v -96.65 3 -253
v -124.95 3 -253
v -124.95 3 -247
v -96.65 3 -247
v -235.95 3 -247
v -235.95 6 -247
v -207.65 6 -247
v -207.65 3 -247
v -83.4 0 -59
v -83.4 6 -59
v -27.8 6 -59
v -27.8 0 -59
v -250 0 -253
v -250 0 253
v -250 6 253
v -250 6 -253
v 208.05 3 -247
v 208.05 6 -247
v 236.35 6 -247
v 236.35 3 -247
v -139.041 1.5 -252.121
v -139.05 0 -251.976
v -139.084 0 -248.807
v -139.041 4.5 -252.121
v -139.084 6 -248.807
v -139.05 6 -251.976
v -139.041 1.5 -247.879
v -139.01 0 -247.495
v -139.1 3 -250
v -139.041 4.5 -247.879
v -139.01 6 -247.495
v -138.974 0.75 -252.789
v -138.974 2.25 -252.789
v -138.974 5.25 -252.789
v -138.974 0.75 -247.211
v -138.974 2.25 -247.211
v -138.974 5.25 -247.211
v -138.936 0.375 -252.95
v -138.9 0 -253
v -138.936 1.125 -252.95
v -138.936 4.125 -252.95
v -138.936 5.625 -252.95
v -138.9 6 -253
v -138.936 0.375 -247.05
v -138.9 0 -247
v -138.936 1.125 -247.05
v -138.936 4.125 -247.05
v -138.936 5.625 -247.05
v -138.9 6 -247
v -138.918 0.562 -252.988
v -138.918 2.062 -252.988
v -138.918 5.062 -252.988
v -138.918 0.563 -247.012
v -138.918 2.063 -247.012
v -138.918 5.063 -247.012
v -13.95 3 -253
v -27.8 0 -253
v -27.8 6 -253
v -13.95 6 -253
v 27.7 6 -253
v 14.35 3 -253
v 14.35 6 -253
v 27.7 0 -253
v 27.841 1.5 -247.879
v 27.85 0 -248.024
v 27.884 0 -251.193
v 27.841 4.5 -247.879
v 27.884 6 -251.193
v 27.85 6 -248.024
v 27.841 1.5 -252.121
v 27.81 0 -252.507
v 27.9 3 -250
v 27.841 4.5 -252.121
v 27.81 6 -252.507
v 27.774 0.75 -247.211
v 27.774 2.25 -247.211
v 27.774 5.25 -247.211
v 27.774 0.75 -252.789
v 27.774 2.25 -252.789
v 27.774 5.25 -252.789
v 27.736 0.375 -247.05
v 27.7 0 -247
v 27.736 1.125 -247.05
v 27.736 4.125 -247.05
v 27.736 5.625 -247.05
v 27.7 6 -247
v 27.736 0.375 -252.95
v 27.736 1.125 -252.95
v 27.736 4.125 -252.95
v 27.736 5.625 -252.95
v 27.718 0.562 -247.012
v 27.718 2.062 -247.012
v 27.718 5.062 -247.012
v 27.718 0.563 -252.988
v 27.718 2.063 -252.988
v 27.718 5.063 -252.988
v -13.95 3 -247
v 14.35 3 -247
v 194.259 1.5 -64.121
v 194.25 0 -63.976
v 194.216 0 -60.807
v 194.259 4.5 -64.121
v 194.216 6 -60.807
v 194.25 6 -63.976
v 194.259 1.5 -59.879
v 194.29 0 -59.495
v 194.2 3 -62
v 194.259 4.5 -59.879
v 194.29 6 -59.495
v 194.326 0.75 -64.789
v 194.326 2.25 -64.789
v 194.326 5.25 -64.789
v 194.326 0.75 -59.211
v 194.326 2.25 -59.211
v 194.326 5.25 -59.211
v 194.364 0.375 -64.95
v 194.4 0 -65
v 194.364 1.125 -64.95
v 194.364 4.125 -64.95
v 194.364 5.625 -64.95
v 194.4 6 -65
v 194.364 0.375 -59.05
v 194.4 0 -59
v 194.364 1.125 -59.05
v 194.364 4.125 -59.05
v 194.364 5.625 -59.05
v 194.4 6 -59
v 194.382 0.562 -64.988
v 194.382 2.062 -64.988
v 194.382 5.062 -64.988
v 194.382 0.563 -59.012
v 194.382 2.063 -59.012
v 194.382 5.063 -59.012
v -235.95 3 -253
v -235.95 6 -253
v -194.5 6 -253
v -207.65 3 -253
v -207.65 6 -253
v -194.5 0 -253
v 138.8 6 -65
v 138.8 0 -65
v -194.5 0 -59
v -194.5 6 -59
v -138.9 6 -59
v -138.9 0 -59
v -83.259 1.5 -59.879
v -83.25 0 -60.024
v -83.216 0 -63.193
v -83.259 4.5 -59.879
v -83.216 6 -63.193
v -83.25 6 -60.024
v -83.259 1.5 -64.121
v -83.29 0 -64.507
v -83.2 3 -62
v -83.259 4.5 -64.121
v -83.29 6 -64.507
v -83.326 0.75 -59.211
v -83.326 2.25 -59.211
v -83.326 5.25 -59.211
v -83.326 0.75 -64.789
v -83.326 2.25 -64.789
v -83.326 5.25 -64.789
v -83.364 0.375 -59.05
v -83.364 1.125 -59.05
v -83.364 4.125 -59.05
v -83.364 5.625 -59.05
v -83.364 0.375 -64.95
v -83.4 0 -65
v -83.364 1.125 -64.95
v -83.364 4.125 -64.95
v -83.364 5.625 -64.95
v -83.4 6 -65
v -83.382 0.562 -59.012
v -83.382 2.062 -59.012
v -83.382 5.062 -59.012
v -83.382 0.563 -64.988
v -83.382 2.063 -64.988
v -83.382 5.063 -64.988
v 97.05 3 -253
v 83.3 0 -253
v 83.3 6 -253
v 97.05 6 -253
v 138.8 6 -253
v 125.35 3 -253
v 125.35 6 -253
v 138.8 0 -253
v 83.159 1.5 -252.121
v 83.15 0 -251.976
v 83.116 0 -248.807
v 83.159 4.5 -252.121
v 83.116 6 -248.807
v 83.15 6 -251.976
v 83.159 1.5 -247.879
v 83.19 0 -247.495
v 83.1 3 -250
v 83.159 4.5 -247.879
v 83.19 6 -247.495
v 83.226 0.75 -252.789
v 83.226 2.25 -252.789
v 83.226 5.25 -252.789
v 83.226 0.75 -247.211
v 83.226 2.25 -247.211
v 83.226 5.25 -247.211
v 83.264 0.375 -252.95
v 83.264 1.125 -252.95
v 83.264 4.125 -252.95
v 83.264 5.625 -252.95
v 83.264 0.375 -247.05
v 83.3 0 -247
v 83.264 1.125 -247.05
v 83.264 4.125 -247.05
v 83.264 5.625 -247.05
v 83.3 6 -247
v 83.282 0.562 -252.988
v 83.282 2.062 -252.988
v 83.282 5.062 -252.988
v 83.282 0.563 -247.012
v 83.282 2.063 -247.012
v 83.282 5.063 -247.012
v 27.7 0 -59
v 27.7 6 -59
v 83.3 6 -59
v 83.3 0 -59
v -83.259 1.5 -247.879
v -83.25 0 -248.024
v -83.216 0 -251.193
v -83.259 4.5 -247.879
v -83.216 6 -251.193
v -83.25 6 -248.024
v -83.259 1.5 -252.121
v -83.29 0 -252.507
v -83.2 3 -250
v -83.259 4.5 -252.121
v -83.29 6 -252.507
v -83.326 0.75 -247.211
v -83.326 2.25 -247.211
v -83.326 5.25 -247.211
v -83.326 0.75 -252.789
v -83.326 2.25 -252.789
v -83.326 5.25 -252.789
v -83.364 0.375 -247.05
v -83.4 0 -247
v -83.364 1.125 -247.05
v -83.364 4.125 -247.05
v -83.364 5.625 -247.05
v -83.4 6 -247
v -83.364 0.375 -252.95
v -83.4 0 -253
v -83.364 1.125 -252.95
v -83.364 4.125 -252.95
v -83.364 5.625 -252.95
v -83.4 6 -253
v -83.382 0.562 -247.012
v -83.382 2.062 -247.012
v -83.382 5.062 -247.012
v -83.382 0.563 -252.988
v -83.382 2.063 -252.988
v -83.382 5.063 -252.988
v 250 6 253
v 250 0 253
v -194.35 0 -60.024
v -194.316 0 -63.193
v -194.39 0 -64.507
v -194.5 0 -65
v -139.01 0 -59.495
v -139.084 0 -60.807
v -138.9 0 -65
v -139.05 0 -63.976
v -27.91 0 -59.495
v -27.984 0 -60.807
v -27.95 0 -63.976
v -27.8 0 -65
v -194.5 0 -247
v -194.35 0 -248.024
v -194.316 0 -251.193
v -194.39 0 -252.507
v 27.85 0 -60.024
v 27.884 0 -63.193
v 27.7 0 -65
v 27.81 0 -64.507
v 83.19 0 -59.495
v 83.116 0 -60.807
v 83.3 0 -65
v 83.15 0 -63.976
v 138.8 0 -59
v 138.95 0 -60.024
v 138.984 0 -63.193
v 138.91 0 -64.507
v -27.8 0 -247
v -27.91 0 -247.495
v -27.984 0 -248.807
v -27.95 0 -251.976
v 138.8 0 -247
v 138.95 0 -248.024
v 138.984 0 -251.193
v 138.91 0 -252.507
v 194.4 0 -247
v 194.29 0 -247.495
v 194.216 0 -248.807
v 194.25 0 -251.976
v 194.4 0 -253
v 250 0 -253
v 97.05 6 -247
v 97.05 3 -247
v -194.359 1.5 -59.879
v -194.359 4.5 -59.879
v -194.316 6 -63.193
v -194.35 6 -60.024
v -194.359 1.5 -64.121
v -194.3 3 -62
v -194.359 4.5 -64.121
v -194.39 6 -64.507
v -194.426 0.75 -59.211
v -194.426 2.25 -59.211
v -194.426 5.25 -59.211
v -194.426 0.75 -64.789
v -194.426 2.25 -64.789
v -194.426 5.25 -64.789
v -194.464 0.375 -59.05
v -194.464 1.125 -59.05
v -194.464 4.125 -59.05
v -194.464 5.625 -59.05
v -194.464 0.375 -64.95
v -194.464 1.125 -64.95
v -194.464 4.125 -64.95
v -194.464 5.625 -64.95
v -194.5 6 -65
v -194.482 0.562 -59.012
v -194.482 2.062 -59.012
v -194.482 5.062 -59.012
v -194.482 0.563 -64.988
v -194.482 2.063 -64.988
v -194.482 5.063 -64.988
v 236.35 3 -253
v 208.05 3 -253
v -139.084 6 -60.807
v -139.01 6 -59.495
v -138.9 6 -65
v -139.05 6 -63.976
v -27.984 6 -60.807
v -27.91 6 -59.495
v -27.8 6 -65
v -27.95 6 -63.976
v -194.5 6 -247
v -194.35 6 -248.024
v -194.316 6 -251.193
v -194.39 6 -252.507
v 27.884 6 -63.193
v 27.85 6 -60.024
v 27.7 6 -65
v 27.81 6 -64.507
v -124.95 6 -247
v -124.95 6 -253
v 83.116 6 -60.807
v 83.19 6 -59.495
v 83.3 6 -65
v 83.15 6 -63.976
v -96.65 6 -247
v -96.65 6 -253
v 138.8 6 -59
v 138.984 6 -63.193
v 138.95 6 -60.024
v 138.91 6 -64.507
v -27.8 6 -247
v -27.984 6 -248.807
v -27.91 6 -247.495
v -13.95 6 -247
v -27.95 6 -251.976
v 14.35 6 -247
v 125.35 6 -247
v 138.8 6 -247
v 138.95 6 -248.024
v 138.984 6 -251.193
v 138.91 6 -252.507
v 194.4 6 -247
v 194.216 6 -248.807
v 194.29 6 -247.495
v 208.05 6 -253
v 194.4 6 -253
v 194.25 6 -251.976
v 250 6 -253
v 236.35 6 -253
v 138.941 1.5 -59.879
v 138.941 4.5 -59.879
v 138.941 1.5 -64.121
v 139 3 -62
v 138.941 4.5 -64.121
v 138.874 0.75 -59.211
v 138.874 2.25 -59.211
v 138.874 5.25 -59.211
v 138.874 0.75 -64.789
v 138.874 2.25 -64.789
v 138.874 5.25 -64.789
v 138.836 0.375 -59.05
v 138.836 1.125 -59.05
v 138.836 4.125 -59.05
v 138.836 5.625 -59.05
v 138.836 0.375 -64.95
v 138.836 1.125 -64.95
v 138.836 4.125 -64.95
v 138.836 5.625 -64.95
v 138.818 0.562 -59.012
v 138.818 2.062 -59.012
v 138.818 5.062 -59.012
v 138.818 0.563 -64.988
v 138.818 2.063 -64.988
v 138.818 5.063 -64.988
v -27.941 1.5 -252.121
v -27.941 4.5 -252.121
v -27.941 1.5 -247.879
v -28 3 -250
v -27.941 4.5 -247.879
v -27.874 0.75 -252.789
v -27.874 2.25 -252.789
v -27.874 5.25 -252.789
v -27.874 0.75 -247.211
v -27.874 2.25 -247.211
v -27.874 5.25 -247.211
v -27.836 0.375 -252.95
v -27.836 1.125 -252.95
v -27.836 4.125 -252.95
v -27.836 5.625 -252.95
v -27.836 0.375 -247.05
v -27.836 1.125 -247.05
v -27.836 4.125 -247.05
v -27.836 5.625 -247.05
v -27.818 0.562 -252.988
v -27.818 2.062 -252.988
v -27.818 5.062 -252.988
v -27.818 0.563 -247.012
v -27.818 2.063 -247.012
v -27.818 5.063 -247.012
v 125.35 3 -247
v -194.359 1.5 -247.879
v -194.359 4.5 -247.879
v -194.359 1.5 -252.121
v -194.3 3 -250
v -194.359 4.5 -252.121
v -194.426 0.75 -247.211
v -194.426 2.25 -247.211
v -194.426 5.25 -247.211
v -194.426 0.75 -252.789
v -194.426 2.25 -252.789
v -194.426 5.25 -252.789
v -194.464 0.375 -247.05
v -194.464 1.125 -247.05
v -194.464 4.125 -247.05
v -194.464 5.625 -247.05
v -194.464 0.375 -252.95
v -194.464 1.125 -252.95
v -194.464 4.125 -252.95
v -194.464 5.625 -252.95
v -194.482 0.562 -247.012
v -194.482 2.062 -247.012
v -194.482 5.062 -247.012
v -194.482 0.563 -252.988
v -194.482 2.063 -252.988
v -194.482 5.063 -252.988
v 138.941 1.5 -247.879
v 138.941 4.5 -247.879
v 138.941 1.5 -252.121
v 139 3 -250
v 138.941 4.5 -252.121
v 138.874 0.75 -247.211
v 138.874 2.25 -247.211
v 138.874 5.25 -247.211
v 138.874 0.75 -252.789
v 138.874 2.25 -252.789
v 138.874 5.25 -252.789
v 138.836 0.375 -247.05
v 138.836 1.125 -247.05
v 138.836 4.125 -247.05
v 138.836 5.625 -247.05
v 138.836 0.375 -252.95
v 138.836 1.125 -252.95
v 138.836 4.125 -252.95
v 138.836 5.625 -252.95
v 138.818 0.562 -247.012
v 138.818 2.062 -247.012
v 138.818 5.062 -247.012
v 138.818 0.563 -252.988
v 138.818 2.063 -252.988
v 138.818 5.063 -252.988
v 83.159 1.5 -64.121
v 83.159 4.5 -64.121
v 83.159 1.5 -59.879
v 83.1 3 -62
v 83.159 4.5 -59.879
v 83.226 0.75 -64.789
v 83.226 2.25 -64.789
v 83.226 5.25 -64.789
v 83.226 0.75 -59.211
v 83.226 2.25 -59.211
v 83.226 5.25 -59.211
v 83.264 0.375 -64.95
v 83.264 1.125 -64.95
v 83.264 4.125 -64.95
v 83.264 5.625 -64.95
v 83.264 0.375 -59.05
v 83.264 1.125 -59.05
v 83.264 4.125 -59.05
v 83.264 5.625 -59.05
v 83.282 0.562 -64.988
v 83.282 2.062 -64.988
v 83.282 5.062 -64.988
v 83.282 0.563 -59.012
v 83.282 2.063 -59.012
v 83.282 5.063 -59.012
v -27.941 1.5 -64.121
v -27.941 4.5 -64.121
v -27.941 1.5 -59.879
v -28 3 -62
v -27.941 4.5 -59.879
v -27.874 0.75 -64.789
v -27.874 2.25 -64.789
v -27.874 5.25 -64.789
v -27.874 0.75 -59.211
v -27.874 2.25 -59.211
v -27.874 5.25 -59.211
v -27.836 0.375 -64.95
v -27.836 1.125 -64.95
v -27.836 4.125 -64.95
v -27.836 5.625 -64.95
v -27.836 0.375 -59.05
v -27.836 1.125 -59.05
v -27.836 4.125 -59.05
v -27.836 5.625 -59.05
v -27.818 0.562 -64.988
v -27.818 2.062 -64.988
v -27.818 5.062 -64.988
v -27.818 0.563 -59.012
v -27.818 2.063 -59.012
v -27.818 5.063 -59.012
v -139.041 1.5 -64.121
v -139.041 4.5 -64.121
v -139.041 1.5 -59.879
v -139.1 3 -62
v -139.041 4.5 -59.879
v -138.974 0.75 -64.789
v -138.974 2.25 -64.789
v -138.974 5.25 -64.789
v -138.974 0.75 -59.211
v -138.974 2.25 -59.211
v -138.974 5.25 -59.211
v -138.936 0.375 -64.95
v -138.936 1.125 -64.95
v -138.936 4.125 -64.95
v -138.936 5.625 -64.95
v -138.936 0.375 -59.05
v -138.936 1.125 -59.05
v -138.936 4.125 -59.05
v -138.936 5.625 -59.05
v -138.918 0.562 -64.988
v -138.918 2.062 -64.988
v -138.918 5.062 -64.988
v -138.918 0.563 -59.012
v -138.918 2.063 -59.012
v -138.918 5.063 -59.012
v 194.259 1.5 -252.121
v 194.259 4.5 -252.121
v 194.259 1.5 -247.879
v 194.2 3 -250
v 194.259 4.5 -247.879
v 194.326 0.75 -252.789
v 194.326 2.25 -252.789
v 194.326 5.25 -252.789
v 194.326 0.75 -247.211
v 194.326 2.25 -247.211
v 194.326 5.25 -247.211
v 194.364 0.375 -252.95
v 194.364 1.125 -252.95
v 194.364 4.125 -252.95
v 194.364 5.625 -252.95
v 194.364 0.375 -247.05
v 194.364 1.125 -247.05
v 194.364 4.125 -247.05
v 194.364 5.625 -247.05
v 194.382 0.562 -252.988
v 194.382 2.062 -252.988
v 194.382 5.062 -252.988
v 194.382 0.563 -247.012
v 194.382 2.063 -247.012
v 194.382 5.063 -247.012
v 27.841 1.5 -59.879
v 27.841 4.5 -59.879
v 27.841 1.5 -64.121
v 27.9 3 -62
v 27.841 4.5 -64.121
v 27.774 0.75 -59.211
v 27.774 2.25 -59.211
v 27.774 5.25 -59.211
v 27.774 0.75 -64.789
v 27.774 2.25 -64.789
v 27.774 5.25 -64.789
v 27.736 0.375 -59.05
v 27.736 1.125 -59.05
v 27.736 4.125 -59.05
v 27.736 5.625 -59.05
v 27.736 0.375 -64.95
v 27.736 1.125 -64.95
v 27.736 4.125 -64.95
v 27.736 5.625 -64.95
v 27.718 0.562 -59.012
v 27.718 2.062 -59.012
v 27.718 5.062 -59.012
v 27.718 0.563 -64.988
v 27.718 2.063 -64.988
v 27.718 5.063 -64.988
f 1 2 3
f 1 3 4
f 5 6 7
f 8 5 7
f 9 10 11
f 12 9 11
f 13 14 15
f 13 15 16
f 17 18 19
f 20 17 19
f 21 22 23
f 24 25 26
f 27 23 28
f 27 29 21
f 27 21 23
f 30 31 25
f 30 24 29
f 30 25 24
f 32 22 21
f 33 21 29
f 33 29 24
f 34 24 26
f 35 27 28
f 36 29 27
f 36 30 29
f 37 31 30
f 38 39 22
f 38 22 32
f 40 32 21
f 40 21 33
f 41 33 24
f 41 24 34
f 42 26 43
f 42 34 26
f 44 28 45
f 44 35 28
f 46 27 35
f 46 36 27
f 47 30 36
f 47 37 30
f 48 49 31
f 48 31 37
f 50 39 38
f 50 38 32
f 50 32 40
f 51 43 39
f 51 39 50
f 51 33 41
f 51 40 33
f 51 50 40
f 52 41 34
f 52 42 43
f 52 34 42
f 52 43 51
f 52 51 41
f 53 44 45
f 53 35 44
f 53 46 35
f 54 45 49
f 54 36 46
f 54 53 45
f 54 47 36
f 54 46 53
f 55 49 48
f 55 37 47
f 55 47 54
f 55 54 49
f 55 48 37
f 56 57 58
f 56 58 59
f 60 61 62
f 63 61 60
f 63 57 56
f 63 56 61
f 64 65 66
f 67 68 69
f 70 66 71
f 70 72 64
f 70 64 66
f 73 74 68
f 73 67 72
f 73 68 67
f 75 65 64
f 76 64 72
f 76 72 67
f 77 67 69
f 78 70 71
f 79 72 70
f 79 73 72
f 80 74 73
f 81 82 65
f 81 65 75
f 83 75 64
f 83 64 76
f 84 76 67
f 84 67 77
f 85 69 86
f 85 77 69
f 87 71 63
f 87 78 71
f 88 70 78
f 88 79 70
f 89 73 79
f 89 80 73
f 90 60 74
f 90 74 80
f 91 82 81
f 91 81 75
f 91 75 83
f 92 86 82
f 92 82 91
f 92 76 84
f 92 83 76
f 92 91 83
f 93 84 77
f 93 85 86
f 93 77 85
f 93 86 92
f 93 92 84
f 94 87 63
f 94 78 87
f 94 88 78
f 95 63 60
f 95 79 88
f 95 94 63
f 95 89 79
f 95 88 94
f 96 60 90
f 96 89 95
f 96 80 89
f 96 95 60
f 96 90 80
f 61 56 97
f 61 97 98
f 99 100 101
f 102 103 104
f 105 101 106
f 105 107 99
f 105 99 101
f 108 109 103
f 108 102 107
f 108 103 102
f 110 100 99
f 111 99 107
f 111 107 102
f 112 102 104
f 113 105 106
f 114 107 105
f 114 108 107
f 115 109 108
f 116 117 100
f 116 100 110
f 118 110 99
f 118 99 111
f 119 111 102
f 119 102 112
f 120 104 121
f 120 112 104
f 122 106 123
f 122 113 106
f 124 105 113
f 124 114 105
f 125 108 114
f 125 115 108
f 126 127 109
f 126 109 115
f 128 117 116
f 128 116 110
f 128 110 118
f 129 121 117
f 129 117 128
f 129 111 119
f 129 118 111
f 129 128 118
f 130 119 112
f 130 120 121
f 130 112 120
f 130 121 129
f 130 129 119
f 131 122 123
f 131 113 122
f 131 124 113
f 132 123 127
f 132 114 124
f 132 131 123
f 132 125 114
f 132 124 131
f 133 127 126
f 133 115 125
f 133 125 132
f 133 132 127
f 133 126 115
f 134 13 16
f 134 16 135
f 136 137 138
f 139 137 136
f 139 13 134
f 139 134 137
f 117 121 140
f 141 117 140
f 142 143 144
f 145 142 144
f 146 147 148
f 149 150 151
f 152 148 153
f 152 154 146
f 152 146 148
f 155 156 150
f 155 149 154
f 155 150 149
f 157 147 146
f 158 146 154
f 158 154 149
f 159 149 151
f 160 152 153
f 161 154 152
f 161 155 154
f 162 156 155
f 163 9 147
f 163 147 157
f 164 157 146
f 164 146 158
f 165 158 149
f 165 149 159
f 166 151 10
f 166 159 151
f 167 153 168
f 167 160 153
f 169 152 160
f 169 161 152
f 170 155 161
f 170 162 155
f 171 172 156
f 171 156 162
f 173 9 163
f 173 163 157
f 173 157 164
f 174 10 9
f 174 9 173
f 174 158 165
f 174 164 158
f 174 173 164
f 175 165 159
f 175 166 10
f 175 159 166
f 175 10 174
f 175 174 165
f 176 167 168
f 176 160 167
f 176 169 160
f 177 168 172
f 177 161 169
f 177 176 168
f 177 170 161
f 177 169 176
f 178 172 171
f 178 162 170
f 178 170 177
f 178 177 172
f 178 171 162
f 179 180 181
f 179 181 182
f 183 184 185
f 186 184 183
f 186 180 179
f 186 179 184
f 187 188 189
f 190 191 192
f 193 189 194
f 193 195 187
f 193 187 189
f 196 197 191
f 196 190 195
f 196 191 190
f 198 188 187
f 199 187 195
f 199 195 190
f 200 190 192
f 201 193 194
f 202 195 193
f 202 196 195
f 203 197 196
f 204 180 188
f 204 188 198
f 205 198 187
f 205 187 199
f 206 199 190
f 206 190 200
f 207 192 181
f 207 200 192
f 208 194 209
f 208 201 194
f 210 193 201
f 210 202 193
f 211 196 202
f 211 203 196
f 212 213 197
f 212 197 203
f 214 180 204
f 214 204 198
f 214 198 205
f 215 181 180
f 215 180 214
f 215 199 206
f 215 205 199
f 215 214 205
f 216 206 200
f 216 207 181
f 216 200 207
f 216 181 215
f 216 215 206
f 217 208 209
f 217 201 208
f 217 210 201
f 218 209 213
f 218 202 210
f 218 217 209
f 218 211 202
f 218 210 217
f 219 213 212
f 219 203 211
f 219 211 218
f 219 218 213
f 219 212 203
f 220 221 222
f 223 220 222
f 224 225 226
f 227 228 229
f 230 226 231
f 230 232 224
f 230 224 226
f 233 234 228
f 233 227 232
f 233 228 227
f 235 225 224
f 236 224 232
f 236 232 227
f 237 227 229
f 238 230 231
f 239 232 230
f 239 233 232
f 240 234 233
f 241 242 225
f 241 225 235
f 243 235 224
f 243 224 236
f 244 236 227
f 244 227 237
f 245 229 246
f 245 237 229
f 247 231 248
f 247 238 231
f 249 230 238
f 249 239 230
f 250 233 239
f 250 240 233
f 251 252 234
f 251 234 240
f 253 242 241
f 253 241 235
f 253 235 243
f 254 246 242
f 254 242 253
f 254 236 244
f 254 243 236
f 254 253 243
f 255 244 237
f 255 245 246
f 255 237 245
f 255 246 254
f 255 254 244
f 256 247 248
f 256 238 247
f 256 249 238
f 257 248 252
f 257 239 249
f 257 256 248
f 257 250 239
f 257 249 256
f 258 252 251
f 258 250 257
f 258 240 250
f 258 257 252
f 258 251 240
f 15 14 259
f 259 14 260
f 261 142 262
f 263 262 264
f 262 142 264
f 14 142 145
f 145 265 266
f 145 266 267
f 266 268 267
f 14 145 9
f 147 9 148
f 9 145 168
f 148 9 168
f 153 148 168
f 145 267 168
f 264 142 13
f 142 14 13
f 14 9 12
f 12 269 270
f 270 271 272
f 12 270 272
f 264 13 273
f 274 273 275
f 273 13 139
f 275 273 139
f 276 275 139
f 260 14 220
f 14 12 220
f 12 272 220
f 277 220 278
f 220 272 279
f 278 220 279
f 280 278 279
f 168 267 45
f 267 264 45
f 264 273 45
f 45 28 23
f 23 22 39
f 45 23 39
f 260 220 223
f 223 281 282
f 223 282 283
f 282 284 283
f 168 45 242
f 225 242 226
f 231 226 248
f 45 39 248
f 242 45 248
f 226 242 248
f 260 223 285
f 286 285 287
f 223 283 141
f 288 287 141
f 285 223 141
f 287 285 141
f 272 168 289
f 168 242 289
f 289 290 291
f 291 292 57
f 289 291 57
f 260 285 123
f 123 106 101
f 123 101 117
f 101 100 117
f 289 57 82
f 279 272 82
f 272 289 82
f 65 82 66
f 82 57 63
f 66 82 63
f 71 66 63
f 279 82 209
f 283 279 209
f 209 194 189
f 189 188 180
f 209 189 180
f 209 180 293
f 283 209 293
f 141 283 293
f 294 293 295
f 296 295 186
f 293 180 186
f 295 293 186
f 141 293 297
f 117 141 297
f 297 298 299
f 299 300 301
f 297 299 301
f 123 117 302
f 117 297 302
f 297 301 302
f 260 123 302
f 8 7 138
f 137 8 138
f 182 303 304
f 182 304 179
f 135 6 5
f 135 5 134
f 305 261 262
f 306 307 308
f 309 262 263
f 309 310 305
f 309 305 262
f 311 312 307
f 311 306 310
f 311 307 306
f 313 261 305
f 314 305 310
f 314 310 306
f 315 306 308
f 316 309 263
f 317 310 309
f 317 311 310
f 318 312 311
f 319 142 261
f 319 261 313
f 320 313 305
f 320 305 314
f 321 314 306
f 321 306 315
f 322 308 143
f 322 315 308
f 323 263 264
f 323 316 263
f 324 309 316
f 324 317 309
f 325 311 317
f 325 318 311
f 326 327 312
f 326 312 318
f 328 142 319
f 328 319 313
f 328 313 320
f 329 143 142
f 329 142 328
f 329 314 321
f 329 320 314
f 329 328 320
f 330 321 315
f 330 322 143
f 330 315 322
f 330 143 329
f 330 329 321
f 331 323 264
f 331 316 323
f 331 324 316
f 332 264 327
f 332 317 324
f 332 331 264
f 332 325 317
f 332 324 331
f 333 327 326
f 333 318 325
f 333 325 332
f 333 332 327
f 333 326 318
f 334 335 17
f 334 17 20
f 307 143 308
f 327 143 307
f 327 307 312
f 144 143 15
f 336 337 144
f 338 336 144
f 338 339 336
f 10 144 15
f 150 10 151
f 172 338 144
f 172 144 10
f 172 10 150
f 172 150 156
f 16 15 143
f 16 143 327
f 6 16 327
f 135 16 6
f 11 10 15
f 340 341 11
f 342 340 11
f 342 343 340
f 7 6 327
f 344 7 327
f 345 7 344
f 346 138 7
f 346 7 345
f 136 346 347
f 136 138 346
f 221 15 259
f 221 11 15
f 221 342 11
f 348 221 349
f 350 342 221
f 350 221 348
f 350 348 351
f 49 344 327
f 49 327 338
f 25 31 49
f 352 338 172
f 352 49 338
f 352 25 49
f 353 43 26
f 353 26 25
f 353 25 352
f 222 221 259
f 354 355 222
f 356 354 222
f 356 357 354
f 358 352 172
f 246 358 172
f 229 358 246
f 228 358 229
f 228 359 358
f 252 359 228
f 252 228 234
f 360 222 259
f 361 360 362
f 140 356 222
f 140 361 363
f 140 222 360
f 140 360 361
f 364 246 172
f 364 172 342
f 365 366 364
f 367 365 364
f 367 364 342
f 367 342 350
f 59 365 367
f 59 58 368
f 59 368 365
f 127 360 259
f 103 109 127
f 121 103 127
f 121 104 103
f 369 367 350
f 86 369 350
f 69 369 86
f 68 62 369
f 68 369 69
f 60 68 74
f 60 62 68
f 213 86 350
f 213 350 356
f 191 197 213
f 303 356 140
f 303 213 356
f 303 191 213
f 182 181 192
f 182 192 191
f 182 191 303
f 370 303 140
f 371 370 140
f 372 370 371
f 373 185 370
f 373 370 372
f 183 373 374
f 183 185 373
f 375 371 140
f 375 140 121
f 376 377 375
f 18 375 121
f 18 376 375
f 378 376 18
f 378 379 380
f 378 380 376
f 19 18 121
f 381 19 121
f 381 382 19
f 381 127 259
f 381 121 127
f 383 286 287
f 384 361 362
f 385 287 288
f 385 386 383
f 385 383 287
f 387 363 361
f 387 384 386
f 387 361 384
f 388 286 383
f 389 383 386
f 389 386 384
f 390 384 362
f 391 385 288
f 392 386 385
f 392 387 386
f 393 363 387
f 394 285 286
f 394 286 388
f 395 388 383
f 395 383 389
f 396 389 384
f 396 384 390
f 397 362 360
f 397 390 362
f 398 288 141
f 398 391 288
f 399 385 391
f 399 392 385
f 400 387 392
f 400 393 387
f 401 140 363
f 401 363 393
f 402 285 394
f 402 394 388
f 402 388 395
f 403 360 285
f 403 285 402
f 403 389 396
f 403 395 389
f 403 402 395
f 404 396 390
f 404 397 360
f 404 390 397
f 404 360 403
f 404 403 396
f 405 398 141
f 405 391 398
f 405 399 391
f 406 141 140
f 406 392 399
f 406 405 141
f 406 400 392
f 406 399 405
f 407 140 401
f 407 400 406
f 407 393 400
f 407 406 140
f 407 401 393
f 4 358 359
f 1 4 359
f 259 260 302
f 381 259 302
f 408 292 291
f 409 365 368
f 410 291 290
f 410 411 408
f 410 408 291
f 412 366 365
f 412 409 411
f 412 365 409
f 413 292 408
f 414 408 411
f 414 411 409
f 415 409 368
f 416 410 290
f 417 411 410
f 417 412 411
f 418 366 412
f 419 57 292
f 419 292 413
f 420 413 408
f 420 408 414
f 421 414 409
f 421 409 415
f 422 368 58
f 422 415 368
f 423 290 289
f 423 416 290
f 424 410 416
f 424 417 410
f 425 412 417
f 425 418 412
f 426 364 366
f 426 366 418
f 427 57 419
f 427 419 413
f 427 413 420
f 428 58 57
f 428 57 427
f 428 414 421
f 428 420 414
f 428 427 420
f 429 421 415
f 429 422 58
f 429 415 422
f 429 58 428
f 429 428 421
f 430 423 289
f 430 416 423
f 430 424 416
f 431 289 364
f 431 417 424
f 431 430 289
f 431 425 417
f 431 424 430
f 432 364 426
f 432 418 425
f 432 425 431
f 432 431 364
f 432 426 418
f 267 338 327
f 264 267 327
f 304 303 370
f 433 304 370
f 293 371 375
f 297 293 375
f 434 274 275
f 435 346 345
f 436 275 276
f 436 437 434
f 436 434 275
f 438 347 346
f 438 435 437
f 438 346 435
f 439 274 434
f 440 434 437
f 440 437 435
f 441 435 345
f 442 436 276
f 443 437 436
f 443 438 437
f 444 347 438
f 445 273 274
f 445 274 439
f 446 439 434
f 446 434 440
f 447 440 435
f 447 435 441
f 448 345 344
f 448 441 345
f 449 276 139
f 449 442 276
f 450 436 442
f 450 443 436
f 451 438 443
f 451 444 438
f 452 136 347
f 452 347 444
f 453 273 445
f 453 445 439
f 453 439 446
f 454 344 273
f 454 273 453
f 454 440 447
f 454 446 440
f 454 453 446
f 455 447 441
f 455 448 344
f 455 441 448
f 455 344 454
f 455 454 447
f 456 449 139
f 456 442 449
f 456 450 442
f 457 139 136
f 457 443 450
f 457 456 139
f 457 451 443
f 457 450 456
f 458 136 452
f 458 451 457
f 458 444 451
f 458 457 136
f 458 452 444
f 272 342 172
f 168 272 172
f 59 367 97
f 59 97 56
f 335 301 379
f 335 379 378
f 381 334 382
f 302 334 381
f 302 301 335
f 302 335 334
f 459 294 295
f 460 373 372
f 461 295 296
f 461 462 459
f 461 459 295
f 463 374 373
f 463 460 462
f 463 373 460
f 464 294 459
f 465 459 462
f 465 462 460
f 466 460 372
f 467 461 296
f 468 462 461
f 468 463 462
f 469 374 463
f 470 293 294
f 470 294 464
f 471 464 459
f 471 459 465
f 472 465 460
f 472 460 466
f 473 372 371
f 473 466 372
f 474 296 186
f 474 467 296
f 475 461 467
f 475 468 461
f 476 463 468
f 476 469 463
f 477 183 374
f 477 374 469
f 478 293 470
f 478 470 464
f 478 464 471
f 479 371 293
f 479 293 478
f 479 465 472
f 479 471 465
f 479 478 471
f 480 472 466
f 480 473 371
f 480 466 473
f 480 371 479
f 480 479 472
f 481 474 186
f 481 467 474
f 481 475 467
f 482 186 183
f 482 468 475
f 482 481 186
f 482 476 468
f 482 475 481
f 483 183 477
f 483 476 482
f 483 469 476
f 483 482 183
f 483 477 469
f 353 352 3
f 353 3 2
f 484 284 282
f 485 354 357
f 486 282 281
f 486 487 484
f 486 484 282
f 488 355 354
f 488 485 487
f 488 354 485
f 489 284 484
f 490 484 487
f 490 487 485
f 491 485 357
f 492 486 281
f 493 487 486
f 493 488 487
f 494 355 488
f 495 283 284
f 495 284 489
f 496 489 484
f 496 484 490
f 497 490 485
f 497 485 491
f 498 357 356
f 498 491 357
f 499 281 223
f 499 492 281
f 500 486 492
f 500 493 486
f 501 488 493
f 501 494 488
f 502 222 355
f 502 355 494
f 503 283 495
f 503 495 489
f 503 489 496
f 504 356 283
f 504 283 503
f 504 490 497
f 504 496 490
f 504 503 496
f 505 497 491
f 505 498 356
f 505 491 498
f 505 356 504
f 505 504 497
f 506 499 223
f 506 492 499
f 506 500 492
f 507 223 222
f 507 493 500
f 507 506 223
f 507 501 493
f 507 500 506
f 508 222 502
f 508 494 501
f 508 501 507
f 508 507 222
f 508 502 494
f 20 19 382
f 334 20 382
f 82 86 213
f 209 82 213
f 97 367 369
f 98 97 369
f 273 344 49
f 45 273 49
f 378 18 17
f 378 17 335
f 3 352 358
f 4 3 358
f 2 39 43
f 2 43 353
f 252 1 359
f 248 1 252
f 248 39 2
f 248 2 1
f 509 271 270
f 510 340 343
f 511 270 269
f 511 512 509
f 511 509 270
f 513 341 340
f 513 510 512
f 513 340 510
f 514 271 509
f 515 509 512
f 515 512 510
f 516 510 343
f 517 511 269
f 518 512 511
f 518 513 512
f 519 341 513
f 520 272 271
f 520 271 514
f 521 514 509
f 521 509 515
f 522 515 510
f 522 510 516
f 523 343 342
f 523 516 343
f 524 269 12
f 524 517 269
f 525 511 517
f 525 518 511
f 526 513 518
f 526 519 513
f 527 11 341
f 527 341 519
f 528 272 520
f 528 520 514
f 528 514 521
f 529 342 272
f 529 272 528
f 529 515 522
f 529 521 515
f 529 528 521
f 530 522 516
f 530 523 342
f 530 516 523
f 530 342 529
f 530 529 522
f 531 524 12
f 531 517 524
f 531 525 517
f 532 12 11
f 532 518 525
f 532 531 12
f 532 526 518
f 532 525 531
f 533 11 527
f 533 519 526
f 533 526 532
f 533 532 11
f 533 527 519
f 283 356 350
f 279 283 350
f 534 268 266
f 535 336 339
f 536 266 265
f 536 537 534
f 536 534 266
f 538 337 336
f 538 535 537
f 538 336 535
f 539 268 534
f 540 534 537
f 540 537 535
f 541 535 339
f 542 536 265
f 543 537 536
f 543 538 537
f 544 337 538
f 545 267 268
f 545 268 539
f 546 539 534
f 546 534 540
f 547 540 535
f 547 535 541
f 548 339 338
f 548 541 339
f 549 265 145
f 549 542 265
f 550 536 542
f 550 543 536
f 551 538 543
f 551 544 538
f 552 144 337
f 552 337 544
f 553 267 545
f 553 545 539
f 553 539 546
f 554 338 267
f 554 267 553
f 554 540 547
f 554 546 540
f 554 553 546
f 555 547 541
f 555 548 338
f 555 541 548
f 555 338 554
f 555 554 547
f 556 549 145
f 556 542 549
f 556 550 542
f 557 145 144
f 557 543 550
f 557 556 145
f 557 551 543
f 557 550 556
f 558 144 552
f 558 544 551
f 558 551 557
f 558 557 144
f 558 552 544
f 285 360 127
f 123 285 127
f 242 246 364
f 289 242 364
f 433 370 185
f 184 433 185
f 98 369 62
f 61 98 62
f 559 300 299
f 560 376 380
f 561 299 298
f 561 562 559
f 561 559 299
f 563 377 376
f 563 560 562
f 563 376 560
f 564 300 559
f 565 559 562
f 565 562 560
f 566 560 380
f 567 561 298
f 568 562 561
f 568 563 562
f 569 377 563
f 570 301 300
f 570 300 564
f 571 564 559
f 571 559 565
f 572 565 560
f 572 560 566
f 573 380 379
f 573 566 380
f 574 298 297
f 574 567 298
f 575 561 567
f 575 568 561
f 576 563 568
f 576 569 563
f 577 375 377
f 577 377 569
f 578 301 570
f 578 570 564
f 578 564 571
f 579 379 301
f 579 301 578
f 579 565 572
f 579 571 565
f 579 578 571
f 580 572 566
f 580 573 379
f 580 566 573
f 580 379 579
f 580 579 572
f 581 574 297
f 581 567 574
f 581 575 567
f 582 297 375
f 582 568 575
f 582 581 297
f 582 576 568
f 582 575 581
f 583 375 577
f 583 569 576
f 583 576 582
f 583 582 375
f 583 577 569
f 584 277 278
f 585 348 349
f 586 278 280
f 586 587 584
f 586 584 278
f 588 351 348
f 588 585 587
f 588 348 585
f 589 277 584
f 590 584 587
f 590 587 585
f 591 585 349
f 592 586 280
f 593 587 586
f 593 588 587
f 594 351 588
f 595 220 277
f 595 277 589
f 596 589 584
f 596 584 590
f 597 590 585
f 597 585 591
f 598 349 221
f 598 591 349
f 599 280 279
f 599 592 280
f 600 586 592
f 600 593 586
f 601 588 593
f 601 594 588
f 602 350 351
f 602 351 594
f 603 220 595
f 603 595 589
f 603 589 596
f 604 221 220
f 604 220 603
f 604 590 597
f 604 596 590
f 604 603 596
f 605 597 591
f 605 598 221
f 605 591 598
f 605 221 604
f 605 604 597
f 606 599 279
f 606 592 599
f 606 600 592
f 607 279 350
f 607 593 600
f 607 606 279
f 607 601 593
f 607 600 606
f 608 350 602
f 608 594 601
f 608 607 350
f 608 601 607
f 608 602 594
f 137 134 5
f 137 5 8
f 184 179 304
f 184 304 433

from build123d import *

# Parameters (mm, degrees)
SKETCH2_W              = 500
SKETCH2_H              = 506
BOSS_EXTRUDE1_DEPTH    = 6
CUT_EXTRUDE1_DEPTH     = 6
LPATTERN1_COUNT        = 4
LPATTERN1_PITCH        = 111.1
LPATTERN2_COUNT        = 2
LPATTERN2_PITCH        = 188
LPATTERN3_COPY_1_DEPTH = 6
LPATTERN3_COPY_2_DEPTH = 6
LPATTERN3_COPY_3_DEPTH = 6
SKETCH9_W              = 28.3
SKETCH9_H              = 6
CUT_EXTRUDE3_DEPTH     = 3
LPATTERN5_COUNT        = 5
LPATTERN5_PITCH        = 111


with BuildPart() as part:
    # Sketch2 → Boss-Extrude1 (new body)
    with BuildSketch(Plane(origin=(0, 0, 0), x_dir=(1, 0, 0), z_dir=(0, 1, 0))):
        Rectangle(SKETCH2_W, SKETCH2_H)
    extrude(amount=BOSS_EXTRUDE1_DEPTH)

    # Sketch3 → Cut-Extrude1 (cut)
    with BuildSketch(Plane(origin=(0, 6, 0), x_dir=(1, 0, 0), z_dir=(0, 1, 0))):
        with BuildLine():
            add(Edge.make_bspline(
                [(194.4, 253), (194.2, 253), (194.2, 250), (194.2, 247), (194.4, 247)],
                knots=[3.141592654, 3.141592654, 3.141592654, 4.71238898, 4.71238898, 6.283185307, 6.283185307, 6.283185307], degree=2, weights=[1, 0.707106781, 1, 0.707106781, 1]))
            Line((194.4, 253), (138.8, 253))
            add(Edge.make_bspline(
                [(138.8, 247), (139, 247), (139, 250), (139, 253), (138.8, 253)],
                knots=[0, 0, 0, 1.570796327, 1.570796327, 3.141592654, 3.141592654, 3.141592654], degree=2, weights=[1, 0.707106781, 1, 0.707106781, 1]))
            Line((138.8, 247), (194.4, 247))
        make_face()
    cut_extrude1 = extrude(amount=-CUT_EXTRUDE1_DEPTH, mode=Mode.SUBTRACT)

    # LPattern1: Cut-Extrude1 ×4
    with Locations(*[(-i * LPATTERN1_PITCH, 0, 0) for i in range(1, LPATTERN1_COUNT)]):
        add(cut_extrude1, mode=Mode.SUBTRACT)

    # LPattern2: Cut-Extrude1 ×2
    with Locations(*[(0, 0, i * LPATTERN2_PITCH) for i in range(1, LPATTERN2_COUNT)]):
        add(cut_extrude1, mode=Mode.SUBTRACT)

    # LPattern3 copy 1 sketch → LPattern3 copy 1 (cut)
    with BuildSketch(Plane(origin=(-111.1, 6, 188), x_dir=(1, 0, 0), z_dir=(0, 1, 0))):
        with BuildLine():
            add(Edge.make_bspline(
                [(194.4, 253), (194.2, 253), (194.2, 250), (194.2, 247), (194.4, 247)],
                knots=[3.141592654, 3.141592654, 3.141592654, 4.71238898, 4.71238898, 6.283185307, 6.283185307, 6.283185307], degree=2, weights=[1, 0.707106781, 1, 0.707106781, 1]))
            Line((194.4, 253), (138.8, 253))
            add(Edge.make_bspline(
                [(138.8, 247), (139, 247), (139, 250), (139, 253), (138.8, 253)],
                knots=[0, 0, 0, 1.570796327, 1.570796327, 3.141592654, 3.141592654, 3.141592654], degree=2, weights=[1, 0.707106781, 1, 0.707106781, 1]))
            Line((138.8, 247), (194.4, 247))
        make_face()
    extrude(amount=-LPATTERN3_COPY_1_DEPTH, mode=Mode.SUBTRACT)

    # LPattern3 copy 2 sketch → LPattern3 copy 2 (cut)
    with BuildSketch(Plane(origin=(-222.2, 6, 188), x_dir=(1, 0, 0), z_dir=(0, 1, 0))):
        with BuildLine():
            add(Edge.make_bspline(
                [(194.4, 253), (194.2, 253), (194.2, 250), (194.2, 247), (194.4, 247)],
                knots=[3.141592654, 3.141592654, 3.141592654, 4.71238898, 4.71238898, 6.283185307, 6.283185307, 6.283185307], degree=2, weights=[1, 0.707106781, 1, 0.707106781, 1]))
            Line((194.4, 253), (138.8, 253))
            add(Edge.make_bspline(
                [(138.8, 247), (139, 247), (139, 250), (139, 253), (138.8, 253)],
                knots=[0, 0, 0, 1.570796327, 1.570796327, 3.141592654, 3.141592654, 3.141592654], degree=2, weights=[1, 0.707106781, 1, 0.707106781, 1]))
            Line((138.8, 247), (194.4, 247))
        make_face()
    extrude(amount=-LPATTERN3_COPY_2_DEPTH, mode=Mode.SUBTRACT)

    # LPattern3 copy 3 sketch → LPattern3 copy 3 (cut)
    with BuildSketch(Plane(origin=(-333.3, 6, 188), x_dir=(1, 0, 0), z_dir=(0, 1, 0))):
        with BuildLine():
            add(Edge.make_bspline(
                [(194.4, 253), (194.2, 253), (194.2, 250), (194.2, 247), (194.4, 247)],
                knots=[3.141592654, 3.141592654, 3.141592654, 4.71238898, 4.71238898, 6.283185307, 6.283185307, 6.283185307], degree=2, weights=[1, 0.707106781, 1, 0.707106781, 1]))
            Line((194.4, 253), (138.8, 253))
            add(Edge.make_bspline(
                [(138.8, 247), (139, 247), (139, 250), (139, 253), (138.8, 253)],
                knots=[0, 0, 0, 1.570796327, 1.570796327, 3.141592654, 3.141592654, 3.141592654], degree=2, weights=[1, 0.707106781, 1, 0.707106781, 1]))
            Line((138.8, 247), (194.4, 247))
        make_face()
    extrude(amount=-LPATTERN3_COPY_3_DEPTH, mode=Mode.SUBTRACT)

    # Sketch9 → Cut-Extrude3 (cut)
    with BuildSketch(Plane(origin=(0, 6, 0), x_dir=(1, 0, 0), z_dir=(0, 1, 0))):
        with Locations((222.2, 250)):
            Rectangle(SKETCH9_W, SKETCH9_H)
    cut_extrude3 = extrude(amount=-CUT_EXTRUDE3_DEPTH, mode=Mode.SUBTRACT)

    # LPattern5: Cut-Extrude3 ×5
    with Locations(*[(-i * LPATTERN5_PITCH, 0, 0) for i in range(1, LPATTERN5_COUNT)]):
        add(cut_extrude3, mode=Mode.SUBTRACT)


solid = part.part
